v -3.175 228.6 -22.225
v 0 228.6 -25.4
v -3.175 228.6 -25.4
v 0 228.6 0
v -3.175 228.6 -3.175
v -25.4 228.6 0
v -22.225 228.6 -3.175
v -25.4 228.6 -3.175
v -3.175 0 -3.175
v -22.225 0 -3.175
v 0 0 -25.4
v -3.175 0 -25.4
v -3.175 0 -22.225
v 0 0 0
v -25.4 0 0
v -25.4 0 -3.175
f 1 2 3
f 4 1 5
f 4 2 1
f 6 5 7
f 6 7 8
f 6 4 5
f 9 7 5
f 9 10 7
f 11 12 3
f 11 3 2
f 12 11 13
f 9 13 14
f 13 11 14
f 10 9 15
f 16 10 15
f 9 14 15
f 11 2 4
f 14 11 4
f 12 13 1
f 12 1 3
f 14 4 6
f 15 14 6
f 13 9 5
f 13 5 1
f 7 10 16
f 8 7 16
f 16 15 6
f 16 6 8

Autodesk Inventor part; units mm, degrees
ref_plane "YZ Plane" through (0, 0, 0) normal (1, 0, 0) x (0, 1, 0)
ref_plane "XZ Plane" through (0, 0, 0) normal (0, 1, 0) x (-1, 0, 0)
ref_plane "XY Plane" through (0, 0, 0) normal (0, 0, 1) x (1, 0, 0)
sketch "Sketch1" plane through (0, 0, 0) normal (0, 1, 0) x (-1, 0, 0)
  line L0 (0, 0) -> (25.4, 0)
  line L1 (25.4, 0) -> (25.4, -25.4)
  line L2 (25.4, -25.4) -> (0, -25.4)
  line L3 (0, -25.4) -> (0, 0)
  line L4 (22.225, -3.175) -> (3.175, -3.175)
  line L5 (3.175, -3.175) -> (3.175, -22.225)
  line L6 (3.175, -22.225) -> (22.225, -22.225)
  line L7 (22.225, -22.225) -> (22.225, -3.175)
  line L8 (22.225, -3.175) -> (25.4, -3.175)
  line L9 (3.175, -22.225) -> (3.175, -25.4)
  dimension "d0" = 25.4
  dimension "d1" = 25.4
  dimension "d2" = 3.175
extrude "Extrusion1" add sketch "Sketch1" along normal blind 228.6 contours L0 L1 L8 L4 L5 L9 L2 L3
properties part number "BumberGussetFront.ver1-1111-2020"
